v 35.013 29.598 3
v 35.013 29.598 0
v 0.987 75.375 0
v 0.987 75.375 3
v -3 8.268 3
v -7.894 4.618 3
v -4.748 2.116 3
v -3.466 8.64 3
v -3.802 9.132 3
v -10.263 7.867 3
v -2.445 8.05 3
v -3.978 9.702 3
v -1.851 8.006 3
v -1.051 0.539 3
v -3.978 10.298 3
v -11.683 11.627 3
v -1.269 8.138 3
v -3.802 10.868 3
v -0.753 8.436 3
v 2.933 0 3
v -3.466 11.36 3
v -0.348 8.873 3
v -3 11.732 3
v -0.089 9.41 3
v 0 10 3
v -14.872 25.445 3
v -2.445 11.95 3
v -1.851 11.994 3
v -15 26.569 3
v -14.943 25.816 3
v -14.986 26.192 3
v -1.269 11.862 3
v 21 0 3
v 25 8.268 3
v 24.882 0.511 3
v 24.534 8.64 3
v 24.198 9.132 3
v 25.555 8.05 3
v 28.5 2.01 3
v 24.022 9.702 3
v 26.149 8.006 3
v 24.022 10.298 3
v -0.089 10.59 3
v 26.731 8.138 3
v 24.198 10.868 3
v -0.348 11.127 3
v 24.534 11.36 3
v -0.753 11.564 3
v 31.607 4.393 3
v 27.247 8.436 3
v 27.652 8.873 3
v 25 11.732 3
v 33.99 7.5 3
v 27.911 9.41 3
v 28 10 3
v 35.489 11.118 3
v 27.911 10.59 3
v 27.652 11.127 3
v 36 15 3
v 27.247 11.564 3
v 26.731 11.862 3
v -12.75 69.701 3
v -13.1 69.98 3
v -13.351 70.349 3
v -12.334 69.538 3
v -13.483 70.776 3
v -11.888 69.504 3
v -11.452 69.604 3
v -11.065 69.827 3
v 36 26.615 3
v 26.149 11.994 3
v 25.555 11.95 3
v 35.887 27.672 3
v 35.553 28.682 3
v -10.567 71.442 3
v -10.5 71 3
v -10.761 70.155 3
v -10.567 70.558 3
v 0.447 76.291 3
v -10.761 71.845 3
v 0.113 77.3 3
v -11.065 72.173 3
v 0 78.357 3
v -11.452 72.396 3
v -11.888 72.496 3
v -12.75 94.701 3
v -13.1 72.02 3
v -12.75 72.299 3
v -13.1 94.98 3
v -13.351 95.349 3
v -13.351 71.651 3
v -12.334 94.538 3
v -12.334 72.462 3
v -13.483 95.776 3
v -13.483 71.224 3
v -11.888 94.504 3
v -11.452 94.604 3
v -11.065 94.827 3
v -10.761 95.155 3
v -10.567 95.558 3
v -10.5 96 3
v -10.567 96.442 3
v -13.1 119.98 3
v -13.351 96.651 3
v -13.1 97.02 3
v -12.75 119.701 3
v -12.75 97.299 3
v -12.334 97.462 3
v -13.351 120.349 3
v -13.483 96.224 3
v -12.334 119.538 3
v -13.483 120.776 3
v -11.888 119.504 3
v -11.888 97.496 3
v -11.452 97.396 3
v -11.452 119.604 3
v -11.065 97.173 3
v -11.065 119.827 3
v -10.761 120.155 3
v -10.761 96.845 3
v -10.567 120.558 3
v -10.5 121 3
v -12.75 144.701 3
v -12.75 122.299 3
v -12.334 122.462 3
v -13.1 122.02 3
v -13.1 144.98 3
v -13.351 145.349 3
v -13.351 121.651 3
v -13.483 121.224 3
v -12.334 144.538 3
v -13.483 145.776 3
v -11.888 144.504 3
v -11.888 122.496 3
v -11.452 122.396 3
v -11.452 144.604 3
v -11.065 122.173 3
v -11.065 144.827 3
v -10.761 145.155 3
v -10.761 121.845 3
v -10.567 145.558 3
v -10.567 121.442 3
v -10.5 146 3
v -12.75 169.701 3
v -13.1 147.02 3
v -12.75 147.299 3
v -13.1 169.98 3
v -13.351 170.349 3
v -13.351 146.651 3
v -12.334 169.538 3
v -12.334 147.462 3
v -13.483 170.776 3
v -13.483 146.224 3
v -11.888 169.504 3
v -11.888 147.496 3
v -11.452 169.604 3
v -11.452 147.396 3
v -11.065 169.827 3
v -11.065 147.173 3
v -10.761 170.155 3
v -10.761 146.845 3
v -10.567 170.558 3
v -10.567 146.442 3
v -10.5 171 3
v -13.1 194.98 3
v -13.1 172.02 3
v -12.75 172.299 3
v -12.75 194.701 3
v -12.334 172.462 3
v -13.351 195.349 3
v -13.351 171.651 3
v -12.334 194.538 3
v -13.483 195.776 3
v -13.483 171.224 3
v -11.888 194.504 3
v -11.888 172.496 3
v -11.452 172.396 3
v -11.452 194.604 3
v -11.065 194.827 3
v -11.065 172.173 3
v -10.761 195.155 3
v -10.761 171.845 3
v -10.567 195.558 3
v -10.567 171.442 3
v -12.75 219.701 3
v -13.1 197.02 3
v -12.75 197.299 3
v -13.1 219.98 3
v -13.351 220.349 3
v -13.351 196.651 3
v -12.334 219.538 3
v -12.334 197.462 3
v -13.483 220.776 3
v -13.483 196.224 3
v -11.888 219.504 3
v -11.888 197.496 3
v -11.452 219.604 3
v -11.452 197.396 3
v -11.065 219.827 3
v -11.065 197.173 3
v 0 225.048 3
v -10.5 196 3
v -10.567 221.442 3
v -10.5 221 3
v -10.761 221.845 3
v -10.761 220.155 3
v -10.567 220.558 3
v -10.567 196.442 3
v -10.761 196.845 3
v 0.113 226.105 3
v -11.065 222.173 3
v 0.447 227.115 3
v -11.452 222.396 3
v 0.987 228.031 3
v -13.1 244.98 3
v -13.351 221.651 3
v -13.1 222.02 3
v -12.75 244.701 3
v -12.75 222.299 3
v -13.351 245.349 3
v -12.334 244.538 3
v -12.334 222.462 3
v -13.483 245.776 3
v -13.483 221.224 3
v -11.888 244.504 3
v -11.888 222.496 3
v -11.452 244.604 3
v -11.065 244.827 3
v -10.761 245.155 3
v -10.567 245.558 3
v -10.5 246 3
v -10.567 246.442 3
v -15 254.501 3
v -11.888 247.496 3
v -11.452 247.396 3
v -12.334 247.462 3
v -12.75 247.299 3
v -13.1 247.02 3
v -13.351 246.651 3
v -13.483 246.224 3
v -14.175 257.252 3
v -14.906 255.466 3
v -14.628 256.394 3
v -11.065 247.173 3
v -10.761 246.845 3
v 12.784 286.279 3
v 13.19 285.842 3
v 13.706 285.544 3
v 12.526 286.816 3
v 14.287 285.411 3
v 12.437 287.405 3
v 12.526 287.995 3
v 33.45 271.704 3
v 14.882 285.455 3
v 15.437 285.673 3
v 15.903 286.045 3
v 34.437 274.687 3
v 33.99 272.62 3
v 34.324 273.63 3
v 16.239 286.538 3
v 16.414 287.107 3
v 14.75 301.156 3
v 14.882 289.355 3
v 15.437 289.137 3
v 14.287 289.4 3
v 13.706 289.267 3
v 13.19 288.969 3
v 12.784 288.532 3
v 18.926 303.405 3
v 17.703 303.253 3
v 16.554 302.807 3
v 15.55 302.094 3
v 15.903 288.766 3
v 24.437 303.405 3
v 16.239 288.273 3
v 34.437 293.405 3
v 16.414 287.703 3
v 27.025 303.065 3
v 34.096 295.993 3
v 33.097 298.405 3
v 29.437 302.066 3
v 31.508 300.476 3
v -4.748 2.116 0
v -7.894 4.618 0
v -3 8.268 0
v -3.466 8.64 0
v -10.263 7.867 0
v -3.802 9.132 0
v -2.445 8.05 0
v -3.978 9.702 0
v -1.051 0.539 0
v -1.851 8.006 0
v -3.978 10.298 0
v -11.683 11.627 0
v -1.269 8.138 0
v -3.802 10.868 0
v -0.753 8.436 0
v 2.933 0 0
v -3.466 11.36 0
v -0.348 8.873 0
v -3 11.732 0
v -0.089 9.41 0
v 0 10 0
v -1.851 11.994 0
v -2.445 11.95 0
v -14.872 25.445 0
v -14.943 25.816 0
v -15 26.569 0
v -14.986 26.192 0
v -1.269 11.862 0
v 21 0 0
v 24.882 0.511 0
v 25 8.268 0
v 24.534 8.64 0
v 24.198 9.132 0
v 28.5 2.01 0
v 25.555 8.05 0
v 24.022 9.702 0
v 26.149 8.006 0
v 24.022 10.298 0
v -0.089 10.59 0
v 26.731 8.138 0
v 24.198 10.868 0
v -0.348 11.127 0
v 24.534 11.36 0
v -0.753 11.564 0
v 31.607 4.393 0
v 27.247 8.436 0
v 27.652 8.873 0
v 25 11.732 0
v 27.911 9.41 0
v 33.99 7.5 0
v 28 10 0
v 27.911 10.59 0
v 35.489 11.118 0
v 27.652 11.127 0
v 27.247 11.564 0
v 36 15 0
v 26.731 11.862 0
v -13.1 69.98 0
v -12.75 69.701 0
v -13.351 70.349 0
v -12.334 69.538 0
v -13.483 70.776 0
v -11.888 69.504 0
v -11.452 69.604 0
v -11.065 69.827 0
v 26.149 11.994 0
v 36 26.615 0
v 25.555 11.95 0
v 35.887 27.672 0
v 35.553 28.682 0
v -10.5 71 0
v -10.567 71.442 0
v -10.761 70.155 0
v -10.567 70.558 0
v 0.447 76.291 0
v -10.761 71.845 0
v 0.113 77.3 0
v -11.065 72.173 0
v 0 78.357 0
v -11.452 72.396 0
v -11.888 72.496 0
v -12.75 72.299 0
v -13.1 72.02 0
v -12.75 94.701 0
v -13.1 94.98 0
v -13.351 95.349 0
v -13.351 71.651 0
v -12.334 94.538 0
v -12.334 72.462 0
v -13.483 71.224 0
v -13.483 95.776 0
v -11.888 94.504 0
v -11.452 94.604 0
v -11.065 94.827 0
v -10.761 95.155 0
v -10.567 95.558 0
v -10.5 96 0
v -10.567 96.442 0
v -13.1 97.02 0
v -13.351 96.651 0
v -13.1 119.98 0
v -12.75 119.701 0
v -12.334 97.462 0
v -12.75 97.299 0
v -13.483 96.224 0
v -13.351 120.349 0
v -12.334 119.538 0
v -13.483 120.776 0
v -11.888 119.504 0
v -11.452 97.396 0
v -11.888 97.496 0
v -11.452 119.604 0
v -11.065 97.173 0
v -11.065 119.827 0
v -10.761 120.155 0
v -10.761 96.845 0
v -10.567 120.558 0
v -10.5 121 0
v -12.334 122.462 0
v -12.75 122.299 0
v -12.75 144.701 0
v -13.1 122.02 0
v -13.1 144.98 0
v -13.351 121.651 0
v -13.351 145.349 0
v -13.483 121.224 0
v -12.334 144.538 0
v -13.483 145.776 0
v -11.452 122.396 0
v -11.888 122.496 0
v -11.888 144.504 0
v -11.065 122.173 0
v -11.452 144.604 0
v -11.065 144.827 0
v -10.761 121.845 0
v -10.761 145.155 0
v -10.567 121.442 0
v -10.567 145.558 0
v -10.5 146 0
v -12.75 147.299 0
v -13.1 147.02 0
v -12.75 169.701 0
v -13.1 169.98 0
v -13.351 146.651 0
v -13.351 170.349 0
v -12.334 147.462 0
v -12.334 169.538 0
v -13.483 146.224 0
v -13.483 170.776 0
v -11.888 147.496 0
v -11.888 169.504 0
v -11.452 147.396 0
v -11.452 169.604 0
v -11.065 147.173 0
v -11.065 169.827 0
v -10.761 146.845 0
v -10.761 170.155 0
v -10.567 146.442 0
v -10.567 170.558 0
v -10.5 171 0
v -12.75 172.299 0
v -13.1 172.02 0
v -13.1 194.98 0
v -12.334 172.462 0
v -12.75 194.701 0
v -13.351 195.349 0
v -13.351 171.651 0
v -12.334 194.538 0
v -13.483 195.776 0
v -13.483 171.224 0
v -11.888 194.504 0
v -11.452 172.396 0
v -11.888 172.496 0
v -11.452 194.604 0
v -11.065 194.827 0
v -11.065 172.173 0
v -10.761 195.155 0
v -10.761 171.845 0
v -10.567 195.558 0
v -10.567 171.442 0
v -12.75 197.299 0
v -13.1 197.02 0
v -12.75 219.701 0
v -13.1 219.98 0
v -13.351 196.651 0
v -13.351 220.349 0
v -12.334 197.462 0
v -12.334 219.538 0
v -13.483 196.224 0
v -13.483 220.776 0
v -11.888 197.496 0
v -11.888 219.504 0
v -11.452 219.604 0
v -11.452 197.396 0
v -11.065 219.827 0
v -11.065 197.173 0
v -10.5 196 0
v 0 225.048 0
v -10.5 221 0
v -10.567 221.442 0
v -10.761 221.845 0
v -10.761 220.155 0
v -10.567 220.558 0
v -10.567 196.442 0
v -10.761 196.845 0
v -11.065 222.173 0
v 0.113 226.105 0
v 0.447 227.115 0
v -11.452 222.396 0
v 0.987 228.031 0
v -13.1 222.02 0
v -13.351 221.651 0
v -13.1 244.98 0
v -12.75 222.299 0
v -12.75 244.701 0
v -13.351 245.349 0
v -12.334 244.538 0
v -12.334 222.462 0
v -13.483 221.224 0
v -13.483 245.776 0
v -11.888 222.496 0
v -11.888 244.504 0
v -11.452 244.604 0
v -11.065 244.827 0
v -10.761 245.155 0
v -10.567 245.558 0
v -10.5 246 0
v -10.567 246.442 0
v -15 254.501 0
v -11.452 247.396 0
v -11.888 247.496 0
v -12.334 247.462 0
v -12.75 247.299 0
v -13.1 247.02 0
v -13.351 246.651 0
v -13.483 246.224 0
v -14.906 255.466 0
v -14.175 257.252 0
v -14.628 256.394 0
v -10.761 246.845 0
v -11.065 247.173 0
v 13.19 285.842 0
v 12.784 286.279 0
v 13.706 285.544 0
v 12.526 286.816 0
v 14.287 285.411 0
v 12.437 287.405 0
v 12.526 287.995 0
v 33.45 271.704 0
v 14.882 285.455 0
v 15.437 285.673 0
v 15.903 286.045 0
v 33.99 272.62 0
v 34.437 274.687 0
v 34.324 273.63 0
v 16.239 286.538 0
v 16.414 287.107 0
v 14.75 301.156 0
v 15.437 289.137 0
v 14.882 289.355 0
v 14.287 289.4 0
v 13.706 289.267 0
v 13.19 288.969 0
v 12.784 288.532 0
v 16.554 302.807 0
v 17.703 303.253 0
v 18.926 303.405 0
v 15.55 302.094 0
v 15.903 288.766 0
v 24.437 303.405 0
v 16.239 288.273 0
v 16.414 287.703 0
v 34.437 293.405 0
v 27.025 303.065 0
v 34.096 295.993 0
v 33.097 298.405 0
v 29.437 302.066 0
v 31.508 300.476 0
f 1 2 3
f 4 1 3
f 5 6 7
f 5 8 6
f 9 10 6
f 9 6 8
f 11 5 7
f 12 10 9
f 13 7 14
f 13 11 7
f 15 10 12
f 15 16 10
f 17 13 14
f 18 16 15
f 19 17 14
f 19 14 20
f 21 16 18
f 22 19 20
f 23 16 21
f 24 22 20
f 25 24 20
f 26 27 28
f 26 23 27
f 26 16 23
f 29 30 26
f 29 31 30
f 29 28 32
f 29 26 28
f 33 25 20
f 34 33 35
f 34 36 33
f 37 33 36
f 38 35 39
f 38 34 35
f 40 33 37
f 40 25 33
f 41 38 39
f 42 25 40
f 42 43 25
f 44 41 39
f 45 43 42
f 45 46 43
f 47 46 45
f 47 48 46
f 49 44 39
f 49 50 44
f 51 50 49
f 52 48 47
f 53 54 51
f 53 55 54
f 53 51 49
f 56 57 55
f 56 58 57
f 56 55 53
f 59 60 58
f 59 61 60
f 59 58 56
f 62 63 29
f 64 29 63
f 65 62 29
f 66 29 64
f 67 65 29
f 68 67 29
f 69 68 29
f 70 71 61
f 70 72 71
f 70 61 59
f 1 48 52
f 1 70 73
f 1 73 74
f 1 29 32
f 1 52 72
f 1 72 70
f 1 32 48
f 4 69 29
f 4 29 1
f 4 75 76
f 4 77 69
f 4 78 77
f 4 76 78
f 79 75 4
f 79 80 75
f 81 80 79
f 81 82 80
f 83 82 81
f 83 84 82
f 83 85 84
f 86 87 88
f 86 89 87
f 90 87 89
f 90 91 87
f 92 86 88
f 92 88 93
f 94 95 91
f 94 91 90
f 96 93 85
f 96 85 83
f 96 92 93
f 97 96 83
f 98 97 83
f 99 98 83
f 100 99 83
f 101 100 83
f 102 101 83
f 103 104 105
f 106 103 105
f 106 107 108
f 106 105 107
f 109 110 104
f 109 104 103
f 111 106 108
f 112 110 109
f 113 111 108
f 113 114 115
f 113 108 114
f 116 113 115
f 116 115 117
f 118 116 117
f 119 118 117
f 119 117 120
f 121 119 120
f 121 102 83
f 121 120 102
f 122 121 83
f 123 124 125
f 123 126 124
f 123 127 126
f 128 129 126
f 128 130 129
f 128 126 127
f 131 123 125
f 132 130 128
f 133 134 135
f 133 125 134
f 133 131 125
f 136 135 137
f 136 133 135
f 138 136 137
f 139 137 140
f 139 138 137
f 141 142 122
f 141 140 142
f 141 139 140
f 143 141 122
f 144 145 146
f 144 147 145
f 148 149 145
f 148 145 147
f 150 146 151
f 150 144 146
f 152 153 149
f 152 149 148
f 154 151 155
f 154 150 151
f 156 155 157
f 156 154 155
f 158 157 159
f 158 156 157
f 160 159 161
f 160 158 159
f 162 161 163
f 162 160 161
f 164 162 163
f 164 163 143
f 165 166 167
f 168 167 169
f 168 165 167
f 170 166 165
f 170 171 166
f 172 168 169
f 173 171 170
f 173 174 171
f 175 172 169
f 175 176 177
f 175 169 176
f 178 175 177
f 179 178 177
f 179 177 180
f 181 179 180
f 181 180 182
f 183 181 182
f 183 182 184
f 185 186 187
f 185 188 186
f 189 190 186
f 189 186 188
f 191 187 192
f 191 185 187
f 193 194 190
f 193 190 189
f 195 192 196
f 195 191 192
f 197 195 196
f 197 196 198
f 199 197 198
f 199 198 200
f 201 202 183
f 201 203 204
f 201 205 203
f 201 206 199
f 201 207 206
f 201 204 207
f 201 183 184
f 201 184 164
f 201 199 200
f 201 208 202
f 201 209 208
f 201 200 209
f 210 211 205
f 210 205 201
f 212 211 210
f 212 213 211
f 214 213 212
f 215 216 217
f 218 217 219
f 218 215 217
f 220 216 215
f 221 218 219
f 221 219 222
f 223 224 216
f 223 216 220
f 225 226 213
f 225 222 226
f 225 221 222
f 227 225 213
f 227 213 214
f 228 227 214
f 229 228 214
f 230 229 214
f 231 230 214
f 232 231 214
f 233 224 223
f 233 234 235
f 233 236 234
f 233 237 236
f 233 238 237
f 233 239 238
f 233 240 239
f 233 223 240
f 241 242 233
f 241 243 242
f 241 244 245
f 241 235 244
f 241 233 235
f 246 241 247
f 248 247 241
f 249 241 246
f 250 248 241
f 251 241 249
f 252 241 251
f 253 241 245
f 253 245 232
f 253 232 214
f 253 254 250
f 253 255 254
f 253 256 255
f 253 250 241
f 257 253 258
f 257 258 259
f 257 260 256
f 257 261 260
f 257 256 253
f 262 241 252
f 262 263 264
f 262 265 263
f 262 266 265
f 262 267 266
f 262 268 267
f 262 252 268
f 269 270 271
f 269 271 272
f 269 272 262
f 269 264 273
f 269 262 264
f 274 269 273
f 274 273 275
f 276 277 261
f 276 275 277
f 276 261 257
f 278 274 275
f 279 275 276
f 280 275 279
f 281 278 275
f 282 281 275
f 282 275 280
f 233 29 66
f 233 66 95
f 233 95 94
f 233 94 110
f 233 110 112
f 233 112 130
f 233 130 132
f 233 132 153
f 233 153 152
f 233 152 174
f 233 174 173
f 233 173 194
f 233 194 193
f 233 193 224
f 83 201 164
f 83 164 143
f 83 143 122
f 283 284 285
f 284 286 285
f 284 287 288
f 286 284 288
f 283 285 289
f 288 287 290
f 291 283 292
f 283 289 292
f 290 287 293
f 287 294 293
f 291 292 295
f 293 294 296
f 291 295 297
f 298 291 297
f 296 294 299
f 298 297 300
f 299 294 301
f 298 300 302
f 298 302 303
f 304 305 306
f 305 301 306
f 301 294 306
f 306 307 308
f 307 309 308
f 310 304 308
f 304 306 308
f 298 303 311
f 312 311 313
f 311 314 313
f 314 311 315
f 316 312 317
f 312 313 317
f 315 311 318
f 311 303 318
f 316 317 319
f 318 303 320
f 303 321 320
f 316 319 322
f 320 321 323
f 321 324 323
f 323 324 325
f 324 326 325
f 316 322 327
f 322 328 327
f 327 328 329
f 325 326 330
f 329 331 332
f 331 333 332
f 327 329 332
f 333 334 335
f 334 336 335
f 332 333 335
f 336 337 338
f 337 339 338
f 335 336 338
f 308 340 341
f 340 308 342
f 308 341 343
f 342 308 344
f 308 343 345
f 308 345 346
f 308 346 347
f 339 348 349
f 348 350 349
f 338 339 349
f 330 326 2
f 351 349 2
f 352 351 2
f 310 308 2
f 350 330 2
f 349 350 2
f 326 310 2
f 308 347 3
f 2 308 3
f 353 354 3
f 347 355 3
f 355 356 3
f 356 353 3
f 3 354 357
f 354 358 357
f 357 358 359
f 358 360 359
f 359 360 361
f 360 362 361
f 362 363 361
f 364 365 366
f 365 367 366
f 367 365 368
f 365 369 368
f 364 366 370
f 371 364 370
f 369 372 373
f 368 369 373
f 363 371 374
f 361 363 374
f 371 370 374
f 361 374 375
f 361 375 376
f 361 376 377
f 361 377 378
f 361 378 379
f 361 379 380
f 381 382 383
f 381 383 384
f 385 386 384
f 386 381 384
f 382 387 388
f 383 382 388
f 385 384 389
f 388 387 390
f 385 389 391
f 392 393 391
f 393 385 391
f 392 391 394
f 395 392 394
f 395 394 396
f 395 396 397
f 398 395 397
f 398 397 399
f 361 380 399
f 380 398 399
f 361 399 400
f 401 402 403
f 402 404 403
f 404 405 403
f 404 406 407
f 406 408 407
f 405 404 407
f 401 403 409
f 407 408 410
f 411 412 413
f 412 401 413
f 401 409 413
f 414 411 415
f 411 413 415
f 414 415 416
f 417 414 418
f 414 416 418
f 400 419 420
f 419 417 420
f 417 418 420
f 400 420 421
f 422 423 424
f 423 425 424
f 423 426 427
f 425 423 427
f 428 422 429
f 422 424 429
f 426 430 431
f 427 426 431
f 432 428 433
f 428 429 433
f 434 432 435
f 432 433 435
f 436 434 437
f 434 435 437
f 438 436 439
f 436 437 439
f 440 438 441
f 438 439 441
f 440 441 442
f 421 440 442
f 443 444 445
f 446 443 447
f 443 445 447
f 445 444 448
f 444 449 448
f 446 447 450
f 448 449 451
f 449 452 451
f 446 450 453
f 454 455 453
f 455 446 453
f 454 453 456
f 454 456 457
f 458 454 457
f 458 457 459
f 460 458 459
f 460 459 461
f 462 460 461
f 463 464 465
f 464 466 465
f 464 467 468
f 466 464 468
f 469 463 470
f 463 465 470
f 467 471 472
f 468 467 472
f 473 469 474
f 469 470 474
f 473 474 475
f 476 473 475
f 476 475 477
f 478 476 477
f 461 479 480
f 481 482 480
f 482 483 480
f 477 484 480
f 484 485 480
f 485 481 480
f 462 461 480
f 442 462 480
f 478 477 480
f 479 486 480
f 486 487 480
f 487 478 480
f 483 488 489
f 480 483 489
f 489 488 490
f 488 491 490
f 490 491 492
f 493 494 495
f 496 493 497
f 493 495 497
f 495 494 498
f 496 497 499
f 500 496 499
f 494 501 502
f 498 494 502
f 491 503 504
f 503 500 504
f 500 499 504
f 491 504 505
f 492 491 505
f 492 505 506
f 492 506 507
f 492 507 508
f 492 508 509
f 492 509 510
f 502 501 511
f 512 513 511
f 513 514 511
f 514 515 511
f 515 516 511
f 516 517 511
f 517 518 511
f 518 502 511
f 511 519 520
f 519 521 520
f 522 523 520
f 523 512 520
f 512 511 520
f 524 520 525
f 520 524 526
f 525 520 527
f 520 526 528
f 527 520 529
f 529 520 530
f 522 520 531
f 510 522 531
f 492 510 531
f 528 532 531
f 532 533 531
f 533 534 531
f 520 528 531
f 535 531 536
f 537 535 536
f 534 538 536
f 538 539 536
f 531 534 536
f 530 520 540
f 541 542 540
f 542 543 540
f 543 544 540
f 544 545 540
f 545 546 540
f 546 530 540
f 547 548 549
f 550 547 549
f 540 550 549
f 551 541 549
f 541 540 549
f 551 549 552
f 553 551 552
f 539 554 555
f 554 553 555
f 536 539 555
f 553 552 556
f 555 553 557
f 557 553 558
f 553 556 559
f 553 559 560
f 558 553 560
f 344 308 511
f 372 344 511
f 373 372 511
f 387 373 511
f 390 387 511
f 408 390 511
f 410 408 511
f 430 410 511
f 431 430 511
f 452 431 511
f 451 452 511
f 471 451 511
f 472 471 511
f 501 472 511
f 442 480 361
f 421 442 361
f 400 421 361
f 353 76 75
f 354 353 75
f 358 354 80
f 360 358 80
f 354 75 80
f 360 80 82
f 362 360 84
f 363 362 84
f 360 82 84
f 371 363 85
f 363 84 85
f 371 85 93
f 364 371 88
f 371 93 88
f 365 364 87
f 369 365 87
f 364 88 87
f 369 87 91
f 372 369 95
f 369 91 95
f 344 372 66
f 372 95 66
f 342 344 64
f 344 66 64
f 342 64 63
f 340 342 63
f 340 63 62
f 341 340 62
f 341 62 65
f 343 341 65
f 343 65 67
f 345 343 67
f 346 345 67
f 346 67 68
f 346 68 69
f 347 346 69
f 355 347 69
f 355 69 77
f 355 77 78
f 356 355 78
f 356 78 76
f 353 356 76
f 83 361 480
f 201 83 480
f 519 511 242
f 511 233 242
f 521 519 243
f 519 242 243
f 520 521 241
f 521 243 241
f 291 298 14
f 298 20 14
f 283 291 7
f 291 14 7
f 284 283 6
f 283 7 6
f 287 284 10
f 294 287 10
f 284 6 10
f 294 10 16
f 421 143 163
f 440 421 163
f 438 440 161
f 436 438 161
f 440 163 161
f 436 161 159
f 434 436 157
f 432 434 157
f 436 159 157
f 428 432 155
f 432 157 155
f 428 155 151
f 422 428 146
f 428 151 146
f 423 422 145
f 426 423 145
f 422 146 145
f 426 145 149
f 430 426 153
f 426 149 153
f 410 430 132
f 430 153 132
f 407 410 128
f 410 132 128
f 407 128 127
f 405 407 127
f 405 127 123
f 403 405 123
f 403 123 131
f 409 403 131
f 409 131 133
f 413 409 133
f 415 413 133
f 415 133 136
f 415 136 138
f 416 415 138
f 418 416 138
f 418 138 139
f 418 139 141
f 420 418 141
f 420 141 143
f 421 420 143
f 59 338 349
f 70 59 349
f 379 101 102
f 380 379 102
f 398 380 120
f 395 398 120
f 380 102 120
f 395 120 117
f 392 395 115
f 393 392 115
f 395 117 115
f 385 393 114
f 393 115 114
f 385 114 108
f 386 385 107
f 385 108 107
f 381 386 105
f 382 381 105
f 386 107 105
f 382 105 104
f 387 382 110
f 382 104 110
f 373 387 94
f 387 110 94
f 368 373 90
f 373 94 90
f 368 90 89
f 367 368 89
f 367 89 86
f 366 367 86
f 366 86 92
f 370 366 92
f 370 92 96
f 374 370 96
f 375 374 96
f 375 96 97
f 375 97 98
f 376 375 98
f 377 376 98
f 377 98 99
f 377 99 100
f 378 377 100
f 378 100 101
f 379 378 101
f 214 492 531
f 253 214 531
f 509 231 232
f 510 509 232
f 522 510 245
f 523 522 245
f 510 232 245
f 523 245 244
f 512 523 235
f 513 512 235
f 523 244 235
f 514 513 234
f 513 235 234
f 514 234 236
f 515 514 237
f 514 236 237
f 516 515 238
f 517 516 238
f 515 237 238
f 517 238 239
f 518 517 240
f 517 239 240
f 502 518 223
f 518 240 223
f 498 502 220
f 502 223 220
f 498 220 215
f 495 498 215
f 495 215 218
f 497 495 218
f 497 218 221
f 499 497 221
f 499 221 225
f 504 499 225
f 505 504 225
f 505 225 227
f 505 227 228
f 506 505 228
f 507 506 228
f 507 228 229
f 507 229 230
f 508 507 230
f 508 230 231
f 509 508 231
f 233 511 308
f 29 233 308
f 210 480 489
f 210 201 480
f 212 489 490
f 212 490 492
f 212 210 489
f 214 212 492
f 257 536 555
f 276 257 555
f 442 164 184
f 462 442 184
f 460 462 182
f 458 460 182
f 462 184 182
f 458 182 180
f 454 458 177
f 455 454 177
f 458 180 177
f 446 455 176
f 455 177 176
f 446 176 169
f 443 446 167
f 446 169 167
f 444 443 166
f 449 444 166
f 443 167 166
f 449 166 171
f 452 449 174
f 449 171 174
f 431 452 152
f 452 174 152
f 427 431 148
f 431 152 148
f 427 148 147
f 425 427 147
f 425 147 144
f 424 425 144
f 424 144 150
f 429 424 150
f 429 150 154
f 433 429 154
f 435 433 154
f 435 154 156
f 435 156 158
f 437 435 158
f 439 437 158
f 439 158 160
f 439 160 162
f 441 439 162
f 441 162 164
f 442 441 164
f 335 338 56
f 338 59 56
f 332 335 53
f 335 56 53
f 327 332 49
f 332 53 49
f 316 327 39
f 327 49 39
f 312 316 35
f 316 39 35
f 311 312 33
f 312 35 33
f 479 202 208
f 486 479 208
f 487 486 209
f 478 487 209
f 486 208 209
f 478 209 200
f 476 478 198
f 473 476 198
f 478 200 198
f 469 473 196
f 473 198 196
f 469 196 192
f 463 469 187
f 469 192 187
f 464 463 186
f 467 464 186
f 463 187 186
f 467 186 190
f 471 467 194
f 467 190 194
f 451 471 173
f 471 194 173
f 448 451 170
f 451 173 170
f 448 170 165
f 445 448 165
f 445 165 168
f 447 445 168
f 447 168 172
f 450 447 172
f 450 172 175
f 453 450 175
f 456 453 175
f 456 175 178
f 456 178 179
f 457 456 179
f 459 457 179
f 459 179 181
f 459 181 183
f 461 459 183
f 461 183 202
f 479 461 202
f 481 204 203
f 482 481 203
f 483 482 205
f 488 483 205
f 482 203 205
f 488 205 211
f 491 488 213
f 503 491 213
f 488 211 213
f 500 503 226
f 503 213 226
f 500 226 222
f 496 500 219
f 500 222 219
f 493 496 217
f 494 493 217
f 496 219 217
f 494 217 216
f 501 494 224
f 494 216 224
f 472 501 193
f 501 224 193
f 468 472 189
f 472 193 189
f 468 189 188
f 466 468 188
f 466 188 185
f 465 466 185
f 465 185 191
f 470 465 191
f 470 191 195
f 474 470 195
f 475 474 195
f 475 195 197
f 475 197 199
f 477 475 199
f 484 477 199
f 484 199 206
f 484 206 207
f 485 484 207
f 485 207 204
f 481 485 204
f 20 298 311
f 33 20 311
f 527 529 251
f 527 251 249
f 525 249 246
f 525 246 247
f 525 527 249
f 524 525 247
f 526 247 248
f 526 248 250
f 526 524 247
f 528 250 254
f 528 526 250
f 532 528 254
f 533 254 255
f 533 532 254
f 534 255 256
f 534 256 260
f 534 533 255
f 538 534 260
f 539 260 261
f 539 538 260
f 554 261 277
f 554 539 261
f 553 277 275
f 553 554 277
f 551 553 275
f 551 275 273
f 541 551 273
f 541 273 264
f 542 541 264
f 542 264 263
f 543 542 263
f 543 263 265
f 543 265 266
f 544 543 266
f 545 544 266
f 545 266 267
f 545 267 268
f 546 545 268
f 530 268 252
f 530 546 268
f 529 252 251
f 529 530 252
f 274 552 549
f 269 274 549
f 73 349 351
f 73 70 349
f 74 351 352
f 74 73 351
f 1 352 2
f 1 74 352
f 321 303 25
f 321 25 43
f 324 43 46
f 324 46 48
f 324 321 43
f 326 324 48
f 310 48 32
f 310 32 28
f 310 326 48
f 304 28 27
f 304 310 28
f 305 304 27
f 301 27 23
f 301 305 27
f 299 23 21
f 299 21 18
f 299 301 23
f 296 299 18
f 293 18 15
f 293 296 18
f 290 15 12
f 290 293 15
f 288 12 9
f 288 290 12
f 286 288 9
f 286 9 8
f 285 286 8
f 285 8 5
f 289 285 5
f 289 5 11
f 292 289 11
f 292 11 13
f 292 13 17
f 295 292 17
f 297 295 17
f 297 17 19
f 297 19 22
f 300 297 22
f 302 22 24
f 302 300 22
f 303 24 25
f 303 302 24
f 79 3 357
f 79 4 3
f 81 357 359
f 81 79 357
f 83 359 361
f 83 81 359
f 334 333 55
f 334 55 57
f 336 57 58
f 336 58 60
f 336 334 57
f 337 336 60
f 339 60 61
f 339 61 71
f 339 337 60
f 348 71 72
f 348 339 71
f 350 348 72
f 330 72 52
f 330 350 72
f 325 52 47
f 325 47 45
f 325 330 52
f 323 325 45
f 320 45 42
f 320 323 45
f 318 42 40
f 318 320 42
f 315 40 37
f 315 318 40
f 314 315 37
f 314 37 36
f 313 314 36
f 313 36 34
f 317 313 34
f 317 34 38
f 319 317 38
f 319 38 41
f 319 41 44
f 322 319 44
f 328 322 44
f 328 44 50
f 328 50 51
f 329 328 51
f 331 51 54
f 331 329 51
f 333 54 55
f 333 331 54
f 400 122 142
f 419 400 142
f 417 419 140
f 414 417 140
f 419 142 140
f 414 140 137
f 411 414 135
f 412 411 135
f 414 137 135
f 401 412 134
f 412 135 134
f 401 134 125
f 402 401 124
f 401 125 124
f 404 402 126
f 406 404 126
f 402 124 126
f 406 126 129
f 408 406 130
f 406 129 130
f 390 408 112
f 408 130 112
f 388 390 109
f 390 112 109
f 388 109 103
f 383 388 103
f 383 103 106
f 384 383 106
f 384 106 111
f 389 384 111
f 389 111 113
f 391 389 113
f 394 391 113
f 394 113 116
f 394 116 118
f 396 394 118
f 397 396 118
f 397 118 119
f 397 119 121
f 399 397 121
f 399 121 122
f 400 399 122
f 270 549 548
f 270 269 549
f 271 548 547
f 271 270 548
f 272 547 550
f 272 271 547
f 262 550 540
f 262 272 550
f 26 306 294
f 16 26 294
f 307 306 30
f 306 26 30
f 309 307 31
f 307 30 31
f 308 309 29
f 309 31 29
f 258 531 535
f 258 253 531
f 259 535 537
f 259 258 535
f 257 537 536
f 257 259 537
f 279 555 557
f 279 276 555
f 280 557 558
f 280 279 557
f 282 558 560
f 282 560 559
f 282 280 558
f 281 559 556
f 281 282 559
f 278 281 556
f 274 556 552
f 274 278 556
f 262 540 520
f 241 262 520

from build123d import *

# Parameters (mm, degrees)
SKETCH_1_R          = 2
EXTRUDE_1_DEPTH     = 3
SKETCH_2_R          = 1.5
CUT_EXTRUDE_1_DEPTH = 306.548310575
FILLET_1_R          = 15
FILLET_2_R          = 5
FILLET_3_R          = 10


with BuildPart() as part:
    # 草图1 → 凸台-拉伸1 (new body)
    with BuildSketch(Plane.XY):
        Polygon((0, 0), (36, 0), (36, 28.269869579), (0, 76.702645079), (0, 226.702645079), (34.436828012, 273.032399523), (34.436828012, 303.405290157), (16.23224311, 303.405290157), (-15, 256), (-15, 26), (-9, 0), align=None)
        with Locations((26, 10)):
            Circle(SKETCH_1_R, mode=Mode.SUBTRACT)
        with Locations(Location((14.436828012, 287.405290157, 0), (0, 0, 180))):
            Circle(SKETCH_1_R, mode=Mode.SUBTRACT)
        with Locations((-2, 10)):
            Circle(SKETCH_1_R, mode=Mode.SUBTRACT)
    extrude(amount=EXTRUDE_1_DEPTH)

    # 草图2 → 切除-拉伸1 (cut, through all)
    with BuildSketch(Plane.XY.offset(3)):
        with Locations((-12, 246)):
            Circle(SKETCH_2_R)
        with Locations((-12, 221)):
            Circle(SKETCH_2_R)
        with Locations((-12, 196)):
            Circle(SKETCH_2_R)
        with Locations((-12, 171)):
            Circle(SKETCH_2_R)
        with Locations((-12, 146)):
            Circle(SKETCH_2_R)
        with Locations((-12, 121)):
            Circle(SKETCH_2_R)
        with Locations((-12, 96)):
            Circle(SKETCH_2_R)
        with Locations((-12, 71)):
            Circle(SKETCH_2_R)
    extrude(amount=-CUT_EXTRUDE_1_DEPTH, mode=Mode.SUBTRACT)

    # 圆角1
    fillet_1_edges = [part.edges().sort_by_distance(p)[0] for p in [
        (-9, 0, 1.5),
        (36, 0, 1.5),
    ]]
    fillet(fillet_1_edges, radius=FILLET_1_R)

    # 圆角2
    fillet_2_edges = [part.edges().sort_by_distance(p)[0] for p in [
        (-15, 26, 1.5),
        (-15, 256, 1.5),
        (16.23224311, 303.405290157, 1.5),
        (34.436828012, 273.032399523, 1.5),
        (0, 226.702645079, 1.5),
        (0, 76.702645079, 1.5),
        (36, 28.269869579, 1.5),
    ]]
    fillet(fillet_2_edges, radius=FILLET_2_R)

    # 圆角3
    fillet_3_edges = [part.edges().sort_by_distance(p)[0] for p in [
        (34.436828012, 303.405290157, 1.5),
    ]]
    fillet(fillet_3_edges, radius=FILLET_3_R)


solid = part.part
